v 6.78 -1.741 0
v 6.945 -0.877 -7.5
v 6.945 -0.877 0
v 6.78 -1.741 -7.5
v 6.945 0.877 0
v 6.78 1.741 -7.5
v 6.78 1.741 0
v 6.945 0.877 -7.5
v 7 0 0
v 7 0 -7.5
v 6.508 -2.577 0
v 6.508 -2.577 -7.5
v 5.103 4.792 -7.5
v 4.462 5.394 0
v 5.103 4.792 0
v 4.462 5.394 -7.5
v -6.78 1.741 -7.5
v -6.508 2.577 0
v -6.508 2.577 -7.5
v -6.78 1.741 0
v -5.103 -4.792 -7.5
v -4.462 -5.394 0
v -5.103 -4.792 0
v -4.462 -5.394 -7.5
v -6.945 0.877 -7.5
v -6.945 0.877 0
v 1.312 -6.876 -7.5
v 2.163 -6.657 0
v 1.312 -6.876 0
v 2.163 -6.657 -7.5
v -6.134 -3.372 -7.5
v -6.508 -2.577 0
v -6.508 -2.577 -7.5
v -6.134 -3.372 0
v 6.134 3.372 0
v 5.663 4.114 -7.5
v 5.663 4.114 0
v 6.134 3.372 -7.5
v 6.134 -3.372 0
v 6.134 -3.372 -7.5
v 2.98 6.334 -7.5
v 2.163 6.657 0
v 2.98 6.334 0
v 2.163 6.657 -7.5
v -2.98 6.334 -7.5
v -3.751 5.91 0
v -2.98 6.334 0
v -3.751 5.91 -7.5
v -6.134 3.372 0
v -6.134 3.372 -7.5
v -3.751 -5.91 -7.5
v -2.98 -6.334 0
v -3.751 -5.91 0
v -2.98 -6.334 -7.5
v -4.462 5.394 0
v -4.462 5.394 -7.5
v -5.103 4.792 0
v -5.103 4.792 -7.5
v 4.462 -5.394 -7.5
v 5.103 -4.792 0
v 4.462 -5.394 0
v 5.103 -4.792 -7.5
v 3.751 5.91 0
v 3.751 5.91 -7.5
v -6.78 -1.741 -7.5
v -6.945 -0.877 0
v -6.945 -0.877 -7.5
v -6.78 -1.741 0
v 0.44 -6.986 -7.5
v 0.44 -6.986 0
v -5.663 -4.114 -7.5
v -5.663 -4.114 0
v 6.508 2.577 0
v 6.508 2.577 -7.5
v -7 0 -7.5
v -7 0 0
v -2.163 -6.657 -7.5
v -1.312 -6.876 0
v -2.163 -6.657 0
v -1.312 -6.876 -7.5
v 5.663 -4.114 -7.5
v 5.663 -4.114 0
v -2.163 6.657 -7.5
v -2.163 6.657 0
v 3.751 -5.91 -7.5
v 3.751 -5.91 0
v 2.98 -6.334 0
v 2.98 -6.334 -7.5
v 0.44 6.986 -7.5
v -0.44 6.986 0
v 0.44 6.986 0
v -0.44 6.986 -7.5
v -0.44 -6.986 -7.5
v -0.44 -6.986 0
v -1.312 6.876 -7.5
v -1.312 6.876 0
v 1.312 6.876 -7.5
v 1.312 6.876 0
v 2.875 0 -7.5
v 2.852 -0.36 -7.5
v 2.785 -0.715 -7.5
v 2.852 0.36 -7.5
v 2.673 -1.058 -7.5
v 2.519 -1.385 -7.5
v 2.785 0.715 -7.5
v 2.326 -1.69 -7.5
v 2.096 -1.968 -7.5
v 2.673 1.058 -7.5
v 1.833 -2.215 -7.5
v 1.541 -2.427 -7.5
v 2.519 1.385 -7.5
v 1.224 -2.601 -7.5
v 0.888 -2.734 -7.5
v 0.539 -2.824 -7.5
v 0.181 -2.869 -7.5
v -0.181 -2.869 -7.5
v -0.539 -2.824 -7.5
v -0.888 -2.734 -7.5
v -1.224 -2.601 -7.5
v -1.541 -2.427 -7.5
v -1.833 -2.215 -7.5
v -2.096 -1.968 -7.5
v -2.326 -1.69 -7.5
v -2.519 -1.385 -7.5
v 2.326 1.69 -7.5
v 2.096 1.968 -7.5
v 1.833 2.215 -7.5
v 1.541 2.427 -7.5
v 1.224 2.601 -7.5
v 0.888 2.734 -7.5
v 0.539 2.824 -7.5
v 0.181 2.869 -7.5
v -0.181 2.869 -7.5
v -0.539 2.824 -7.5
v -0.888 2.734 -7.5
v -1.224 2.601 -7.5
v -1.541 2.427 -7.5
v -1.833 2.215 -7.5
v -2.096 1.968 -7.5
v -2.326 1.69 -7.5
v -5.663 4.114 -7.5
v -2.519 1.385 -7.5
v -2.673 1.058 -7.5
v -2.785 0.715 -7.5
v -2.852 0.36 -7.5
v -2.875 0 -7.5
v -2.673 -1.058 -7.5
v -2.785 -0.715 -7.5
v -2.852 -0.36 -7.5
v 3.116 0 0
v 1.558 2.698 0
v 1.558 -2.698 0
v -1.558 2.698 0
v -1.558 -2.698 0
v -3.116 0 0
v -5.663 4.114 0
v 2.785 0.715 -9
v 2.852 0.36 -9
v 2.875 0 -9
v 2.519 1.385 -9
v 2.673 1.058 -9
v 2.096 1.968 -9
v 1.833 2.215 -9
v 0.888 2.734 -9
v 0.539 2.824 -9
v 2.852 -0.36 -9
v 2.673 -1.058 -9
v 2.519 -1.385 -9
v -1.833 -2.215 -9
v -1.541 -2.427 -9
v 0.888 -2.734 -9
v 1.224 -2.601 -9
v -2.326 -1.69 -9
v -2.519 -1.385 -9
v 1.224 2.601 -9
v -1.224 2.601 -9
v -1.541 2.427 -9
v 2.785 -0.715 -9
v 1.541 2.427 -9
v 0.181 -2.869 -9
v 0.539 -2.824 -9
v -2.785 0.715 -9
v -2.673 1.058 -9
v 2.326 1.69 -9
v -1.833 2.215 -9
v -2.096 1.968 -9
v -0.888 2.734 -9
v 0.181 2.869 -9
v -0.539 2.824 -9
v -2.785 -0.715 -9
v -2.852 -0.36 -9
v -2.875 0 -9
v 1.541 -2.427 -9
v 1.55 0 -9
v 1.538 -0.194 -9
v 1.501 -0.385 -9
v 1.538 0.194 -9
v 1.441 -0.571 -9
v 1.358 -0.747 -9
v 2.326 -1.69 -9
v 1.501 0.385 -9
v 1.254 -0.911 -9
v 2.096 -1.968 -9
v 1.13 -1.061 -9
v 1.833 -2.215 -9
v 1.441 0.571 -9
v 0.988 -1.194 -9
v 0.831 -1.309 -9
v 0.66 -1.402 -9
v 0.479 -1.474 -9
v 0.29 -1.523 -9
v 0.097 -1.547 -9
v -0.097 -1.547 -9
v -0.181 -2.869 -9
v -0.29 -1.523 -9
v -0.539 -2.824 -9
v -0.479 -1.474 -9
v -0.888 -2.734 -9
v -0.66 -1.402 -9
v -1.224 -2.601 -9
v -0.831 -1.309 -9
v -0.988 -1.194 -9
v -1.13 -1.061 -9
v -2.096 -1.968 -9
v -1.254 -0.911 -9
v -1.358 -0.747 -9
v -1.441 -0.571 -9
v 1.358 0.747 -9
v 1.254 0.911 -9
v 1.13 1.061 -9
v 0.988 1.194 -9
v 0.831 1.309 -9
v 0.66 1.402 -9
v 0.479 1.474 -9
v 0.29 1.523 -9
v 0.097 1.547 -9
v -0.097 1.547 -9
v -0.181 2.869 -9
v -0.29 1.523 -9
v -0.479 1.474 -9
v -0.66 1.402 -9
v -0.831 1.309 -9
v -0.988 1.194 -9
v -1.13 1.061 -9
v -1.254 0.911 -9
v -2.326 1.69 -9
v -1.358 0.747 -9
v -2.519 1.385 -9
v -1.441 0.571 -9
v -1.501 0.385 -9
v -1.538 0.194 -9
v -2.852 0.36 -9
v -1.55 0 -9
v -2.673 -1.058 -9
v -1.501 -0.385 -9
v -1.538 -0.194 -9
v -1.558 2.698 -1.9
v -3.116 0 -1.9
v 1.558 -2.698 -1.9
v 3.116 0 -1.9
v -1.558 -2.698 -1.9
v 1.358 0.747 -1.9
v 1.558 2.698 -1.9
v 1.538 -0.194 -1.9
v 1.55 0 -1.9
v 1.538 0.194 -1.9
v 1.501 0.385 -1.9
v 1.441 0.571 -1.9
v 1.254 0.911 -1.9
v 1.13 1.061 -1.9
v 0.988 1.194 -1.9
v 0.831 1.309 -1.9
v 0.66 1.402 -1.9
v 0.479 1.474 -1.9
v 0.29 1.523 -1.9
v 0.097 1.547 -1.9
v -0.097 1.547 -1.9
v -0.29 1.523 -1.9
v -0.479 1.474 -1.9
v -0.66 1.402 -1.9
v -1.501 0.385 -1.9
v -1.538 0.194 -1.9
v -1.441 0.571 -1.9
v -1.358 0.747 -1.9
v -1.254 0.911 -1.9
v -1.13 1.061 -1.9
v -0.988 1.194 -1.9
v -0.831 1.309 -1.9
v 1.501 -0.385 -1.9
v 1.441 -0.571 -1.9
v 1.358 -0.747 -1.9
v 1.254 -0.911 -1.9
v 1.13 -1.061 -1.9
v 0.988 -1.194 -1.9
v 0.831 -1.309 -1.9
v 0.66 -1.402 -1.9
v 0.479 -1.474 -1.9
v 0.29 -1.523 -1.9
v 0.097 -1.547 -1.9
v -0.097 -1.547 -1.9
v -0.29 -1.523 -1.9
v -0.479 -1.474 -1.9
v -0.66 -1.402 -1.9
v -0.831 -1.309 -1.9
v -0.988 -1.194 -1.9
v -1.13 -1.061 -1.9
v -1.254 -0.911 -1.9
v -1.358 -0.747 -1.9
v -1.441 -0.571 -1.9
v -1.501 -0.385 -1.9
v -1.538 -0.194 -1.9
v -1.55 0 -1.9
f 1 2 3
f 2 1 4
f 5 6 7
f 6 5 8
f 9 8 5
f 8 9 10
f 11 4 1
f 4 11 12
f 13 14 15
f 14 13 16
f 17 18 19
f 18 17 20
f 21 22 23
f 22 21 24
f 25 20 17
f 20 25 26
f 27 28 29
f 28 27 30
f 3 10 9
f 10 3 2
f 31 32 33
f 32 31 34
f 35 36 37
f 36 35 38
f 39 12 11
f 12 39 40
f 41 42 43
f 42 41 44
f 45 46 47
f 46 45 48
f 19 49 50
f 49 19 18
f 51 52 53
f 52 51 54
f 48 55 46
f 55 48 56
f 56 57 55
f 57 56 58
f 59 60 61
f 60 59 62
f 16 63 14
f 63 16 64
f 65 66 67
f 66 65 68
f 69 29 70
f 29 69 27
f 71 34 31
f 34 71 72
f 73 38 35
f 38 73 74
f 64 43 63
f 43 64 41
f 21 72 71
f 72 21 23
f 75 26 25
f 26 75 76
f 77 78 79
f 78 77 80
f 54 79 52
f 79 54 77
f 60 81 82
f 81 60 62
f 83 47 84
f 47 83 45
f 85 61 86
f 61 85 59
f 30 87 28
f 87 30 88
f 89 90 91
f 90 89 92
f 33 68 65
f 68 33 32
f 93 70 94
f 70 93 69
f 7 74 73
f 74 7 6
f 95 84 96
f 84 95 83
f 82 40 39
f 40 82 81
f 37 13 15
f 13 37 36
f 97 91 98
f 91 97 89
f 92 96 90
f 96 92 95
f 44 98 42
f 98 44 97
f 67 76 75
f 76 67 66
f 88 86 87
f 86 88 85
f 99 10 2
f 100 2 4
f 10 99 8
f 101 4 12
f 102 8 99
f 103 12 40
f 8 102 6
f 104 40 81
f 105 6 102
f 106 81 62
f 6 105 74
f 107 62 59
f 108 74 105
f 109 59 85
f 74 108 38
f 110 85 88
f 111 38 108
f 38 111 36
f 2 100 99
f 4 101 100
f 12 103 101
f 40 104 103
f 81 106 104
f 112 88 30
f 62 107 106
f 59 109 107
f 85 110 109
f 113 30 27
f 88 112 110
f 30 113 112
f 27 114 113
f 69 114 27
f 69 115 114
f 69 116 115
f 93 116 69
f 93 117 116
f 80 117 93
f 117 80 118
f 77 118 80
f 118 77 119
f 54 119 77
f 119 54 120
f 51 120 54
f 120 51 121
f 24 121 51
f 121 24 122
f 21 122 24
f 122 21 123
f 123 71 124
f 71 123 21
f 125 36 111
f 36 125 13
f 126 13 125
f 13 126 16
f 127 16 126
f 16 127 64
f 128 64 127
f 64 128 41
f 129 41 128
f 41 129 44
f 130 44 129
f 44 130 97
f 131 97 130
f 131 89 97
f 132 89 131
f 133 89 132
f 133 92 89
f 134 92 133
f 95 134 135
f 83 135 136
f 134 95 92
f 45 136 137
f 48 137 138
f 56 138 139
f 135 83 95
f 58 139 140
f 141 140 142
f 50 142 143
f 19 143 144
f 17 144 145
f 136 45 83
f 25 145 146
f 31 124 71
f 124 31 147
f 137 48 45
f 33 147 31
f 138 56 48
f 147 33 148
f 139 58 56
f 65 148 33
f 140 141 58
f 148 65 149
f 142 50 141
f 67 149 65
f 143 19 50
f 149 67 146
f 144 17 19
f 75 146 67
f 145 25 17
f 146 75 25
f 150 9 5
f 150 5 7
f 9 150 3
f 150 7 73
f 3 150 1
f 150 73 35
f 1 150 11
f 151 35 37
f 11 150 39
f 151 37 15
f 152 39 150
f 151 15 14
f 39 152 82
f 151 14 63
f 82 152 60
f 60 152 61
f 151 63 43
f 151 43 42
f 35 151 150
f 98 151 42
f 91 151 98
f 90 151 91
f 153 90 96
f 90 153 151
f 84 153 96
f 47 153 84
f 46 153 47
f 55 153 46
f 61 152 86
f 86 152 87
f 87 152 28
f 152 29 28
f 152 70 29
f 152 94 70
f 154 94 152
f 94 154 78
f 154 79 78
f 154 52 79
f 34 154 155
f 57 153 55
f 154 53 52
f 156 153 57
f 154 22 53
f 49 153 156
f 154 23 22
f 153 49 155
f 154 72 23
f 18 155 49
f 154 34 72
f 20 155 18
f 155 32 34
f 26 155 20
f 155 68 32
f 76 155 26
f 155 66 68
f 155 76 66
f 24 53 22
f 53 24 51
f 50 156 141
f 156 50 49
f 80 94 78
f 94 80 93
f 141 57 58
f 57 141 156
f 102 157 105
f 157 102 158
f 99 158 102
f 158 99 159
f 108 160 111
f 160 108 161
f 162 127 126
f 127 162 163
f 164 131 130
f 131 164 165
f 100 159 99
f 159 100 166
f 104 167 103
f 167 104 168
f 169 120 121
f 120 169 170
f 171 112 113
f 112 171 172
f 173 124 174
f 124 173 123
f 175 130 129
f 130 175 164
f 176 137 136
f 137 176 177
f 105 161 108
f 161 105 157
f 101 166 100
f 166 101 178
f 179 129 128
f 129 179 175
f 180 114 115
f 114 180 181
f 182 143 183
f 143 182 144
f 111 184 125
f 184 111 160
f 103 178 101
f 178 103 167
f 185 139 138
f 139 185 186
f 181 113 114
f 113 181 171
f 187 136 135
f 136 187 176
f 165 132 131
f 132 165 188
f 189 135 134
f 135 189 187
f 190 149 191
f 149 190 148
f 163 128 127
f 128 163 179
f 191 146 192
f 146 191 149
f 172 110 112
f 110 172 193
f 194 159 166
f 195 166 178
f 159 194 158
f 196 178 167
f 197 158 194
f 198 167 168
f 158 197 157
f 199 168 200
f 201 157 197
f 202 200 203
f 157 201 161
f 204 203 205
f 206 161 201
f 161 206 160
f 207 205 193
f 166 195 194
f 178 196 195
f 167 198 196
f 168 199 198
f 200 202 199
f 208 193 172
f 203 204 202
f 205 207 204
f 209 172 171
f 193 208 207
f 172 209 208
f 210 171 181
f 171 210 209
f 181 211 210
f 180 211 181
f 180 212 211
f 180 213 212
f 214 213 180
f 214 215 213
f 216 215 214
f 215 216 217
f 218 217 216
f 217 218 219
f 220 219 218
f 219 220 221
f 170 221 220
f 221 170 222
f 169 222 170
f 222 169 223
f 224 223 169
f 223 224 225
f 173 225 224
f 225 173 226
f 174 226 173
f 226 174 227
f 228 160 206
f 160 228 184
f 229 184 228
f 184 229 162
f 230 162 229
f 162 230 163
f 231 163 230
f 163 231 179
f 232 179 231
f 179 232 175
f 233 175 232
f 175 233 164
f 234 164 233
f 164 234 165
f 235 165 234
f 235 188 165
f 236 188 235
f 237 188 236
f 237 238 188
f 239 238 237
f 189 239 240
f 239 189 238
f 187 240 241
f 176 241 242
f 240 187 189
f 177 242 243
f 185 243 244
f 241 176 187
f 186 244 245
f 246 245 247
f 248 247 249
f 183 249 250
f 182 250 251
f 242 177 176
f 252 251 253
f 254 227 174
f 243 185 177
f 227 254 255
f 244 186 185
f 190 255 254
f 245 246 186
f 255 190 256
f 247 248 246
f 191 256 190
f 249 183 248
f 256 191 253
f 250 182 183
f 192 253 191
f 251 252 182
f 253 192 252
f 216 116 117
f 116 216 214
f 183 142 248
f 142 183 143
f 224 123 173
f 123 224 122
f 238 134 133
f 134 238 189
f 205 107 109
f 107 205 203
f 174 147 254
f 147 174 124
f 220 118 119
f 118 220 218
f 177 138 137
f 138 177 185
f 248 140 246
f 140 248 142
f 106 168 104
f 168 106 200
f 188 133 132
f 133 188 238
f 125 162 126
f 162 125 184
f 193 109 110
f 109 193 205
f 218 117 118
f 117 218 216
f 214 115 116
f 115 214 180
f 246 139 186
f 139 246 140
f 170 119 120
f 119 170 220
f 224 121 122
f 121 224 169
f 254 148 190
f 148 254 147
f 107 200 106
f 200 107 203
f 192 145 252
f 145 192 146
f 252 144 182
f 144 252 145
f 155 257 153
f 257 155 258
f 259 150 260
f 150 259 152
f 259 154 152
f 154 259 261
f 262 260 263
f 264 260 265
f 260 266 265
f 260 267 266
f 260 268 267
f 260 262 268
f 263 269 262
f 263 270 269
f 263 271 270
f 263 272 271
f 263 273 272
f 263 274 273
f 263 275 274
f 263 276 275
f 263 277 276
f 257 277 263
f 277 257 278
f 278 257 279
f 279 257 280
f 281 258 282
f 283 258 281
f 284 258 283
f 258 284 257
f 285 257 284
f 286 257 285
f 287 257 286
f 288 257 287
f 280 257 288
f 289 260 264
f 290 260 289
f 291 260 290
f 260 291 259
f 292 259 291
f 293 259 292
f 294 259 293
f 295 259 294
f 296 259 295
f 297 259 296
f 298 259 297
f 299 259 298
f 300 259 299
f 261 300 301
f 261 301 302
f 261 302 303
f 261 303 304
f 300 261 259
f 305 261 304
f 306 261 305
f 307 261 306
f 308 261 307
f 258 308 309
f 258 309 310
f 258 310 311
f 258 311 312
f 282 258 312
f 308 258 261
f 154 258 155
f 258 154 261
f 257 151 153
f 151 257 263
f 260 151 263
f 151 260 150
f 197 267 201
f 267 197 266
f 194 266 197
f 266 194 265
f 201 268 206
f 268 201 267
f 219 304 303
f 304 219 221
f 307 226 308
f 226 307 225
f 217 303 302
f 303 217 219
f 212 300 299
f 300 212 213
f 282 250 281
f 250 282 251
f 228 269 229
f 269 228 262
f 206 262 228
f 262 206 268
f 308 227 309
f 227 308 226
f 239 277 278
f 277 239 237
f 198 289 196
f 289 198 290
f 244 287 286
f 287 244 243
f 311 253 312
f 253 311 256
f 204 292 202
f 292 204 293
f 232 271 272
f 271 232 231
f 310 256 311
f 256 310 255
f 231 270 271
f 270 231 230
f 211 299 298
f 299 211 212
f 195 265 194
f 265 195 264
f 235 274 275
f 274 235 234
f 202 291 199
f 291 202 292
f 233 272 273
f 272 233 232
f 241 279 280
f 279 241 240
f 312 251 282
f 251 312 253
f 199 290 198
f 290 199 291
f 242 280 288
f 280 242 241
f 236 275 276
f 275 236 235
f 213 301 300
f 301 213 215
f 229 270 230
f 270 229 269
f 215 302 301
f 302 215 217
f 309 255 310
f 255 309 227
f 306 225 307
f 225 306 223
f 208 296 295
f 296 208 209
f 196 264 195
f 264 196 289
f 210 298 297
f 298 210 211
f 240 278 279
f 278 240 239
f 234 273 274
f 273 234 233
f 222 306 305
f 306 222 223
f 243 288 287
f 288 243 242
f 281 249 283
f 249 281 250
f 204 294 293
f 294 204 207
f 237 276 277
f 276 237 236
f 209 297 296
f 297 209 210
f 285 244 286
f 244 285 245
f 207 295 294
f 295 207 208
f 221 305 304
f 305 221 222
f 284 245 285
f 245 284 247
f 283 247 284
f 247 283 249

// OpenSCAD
$fn = 50;

difference() {
	union() {
		translate(v = [0, 0, -7.5]) {
			cylinder(h = 7.5, r = 7.0);
		}
		#translate(v = [0, 0, -9.0]) {
			cylinder(h = 9, r = 2.875);
		}
	}
	union() {
		translate(v = [0, 0, 0]) {
			rotate(a = [0, 0, 0]) {
				difference() {
					union() {
						translate(v = [0, 0, -1.9]) {
							linear_extrude(height = 1.9) {
								polygon(points = [[3.1158, 0.0], [1.5579000000000005, 2.698361953111554], [-1.5578999999999994, 2.6983619531115544], [-3.1158, 3.815754496783323e-16], [-1.5579000000000014, -2.6983619531115535], [1.557899999999998, -2.6983619531115552]]);
							}
						}
					}
					union();
				}
			}
		}
		#translate(v = [0, 0, -100.0]) {
			cylinder(h = 200, r = 1.55);
		}
	}
}
